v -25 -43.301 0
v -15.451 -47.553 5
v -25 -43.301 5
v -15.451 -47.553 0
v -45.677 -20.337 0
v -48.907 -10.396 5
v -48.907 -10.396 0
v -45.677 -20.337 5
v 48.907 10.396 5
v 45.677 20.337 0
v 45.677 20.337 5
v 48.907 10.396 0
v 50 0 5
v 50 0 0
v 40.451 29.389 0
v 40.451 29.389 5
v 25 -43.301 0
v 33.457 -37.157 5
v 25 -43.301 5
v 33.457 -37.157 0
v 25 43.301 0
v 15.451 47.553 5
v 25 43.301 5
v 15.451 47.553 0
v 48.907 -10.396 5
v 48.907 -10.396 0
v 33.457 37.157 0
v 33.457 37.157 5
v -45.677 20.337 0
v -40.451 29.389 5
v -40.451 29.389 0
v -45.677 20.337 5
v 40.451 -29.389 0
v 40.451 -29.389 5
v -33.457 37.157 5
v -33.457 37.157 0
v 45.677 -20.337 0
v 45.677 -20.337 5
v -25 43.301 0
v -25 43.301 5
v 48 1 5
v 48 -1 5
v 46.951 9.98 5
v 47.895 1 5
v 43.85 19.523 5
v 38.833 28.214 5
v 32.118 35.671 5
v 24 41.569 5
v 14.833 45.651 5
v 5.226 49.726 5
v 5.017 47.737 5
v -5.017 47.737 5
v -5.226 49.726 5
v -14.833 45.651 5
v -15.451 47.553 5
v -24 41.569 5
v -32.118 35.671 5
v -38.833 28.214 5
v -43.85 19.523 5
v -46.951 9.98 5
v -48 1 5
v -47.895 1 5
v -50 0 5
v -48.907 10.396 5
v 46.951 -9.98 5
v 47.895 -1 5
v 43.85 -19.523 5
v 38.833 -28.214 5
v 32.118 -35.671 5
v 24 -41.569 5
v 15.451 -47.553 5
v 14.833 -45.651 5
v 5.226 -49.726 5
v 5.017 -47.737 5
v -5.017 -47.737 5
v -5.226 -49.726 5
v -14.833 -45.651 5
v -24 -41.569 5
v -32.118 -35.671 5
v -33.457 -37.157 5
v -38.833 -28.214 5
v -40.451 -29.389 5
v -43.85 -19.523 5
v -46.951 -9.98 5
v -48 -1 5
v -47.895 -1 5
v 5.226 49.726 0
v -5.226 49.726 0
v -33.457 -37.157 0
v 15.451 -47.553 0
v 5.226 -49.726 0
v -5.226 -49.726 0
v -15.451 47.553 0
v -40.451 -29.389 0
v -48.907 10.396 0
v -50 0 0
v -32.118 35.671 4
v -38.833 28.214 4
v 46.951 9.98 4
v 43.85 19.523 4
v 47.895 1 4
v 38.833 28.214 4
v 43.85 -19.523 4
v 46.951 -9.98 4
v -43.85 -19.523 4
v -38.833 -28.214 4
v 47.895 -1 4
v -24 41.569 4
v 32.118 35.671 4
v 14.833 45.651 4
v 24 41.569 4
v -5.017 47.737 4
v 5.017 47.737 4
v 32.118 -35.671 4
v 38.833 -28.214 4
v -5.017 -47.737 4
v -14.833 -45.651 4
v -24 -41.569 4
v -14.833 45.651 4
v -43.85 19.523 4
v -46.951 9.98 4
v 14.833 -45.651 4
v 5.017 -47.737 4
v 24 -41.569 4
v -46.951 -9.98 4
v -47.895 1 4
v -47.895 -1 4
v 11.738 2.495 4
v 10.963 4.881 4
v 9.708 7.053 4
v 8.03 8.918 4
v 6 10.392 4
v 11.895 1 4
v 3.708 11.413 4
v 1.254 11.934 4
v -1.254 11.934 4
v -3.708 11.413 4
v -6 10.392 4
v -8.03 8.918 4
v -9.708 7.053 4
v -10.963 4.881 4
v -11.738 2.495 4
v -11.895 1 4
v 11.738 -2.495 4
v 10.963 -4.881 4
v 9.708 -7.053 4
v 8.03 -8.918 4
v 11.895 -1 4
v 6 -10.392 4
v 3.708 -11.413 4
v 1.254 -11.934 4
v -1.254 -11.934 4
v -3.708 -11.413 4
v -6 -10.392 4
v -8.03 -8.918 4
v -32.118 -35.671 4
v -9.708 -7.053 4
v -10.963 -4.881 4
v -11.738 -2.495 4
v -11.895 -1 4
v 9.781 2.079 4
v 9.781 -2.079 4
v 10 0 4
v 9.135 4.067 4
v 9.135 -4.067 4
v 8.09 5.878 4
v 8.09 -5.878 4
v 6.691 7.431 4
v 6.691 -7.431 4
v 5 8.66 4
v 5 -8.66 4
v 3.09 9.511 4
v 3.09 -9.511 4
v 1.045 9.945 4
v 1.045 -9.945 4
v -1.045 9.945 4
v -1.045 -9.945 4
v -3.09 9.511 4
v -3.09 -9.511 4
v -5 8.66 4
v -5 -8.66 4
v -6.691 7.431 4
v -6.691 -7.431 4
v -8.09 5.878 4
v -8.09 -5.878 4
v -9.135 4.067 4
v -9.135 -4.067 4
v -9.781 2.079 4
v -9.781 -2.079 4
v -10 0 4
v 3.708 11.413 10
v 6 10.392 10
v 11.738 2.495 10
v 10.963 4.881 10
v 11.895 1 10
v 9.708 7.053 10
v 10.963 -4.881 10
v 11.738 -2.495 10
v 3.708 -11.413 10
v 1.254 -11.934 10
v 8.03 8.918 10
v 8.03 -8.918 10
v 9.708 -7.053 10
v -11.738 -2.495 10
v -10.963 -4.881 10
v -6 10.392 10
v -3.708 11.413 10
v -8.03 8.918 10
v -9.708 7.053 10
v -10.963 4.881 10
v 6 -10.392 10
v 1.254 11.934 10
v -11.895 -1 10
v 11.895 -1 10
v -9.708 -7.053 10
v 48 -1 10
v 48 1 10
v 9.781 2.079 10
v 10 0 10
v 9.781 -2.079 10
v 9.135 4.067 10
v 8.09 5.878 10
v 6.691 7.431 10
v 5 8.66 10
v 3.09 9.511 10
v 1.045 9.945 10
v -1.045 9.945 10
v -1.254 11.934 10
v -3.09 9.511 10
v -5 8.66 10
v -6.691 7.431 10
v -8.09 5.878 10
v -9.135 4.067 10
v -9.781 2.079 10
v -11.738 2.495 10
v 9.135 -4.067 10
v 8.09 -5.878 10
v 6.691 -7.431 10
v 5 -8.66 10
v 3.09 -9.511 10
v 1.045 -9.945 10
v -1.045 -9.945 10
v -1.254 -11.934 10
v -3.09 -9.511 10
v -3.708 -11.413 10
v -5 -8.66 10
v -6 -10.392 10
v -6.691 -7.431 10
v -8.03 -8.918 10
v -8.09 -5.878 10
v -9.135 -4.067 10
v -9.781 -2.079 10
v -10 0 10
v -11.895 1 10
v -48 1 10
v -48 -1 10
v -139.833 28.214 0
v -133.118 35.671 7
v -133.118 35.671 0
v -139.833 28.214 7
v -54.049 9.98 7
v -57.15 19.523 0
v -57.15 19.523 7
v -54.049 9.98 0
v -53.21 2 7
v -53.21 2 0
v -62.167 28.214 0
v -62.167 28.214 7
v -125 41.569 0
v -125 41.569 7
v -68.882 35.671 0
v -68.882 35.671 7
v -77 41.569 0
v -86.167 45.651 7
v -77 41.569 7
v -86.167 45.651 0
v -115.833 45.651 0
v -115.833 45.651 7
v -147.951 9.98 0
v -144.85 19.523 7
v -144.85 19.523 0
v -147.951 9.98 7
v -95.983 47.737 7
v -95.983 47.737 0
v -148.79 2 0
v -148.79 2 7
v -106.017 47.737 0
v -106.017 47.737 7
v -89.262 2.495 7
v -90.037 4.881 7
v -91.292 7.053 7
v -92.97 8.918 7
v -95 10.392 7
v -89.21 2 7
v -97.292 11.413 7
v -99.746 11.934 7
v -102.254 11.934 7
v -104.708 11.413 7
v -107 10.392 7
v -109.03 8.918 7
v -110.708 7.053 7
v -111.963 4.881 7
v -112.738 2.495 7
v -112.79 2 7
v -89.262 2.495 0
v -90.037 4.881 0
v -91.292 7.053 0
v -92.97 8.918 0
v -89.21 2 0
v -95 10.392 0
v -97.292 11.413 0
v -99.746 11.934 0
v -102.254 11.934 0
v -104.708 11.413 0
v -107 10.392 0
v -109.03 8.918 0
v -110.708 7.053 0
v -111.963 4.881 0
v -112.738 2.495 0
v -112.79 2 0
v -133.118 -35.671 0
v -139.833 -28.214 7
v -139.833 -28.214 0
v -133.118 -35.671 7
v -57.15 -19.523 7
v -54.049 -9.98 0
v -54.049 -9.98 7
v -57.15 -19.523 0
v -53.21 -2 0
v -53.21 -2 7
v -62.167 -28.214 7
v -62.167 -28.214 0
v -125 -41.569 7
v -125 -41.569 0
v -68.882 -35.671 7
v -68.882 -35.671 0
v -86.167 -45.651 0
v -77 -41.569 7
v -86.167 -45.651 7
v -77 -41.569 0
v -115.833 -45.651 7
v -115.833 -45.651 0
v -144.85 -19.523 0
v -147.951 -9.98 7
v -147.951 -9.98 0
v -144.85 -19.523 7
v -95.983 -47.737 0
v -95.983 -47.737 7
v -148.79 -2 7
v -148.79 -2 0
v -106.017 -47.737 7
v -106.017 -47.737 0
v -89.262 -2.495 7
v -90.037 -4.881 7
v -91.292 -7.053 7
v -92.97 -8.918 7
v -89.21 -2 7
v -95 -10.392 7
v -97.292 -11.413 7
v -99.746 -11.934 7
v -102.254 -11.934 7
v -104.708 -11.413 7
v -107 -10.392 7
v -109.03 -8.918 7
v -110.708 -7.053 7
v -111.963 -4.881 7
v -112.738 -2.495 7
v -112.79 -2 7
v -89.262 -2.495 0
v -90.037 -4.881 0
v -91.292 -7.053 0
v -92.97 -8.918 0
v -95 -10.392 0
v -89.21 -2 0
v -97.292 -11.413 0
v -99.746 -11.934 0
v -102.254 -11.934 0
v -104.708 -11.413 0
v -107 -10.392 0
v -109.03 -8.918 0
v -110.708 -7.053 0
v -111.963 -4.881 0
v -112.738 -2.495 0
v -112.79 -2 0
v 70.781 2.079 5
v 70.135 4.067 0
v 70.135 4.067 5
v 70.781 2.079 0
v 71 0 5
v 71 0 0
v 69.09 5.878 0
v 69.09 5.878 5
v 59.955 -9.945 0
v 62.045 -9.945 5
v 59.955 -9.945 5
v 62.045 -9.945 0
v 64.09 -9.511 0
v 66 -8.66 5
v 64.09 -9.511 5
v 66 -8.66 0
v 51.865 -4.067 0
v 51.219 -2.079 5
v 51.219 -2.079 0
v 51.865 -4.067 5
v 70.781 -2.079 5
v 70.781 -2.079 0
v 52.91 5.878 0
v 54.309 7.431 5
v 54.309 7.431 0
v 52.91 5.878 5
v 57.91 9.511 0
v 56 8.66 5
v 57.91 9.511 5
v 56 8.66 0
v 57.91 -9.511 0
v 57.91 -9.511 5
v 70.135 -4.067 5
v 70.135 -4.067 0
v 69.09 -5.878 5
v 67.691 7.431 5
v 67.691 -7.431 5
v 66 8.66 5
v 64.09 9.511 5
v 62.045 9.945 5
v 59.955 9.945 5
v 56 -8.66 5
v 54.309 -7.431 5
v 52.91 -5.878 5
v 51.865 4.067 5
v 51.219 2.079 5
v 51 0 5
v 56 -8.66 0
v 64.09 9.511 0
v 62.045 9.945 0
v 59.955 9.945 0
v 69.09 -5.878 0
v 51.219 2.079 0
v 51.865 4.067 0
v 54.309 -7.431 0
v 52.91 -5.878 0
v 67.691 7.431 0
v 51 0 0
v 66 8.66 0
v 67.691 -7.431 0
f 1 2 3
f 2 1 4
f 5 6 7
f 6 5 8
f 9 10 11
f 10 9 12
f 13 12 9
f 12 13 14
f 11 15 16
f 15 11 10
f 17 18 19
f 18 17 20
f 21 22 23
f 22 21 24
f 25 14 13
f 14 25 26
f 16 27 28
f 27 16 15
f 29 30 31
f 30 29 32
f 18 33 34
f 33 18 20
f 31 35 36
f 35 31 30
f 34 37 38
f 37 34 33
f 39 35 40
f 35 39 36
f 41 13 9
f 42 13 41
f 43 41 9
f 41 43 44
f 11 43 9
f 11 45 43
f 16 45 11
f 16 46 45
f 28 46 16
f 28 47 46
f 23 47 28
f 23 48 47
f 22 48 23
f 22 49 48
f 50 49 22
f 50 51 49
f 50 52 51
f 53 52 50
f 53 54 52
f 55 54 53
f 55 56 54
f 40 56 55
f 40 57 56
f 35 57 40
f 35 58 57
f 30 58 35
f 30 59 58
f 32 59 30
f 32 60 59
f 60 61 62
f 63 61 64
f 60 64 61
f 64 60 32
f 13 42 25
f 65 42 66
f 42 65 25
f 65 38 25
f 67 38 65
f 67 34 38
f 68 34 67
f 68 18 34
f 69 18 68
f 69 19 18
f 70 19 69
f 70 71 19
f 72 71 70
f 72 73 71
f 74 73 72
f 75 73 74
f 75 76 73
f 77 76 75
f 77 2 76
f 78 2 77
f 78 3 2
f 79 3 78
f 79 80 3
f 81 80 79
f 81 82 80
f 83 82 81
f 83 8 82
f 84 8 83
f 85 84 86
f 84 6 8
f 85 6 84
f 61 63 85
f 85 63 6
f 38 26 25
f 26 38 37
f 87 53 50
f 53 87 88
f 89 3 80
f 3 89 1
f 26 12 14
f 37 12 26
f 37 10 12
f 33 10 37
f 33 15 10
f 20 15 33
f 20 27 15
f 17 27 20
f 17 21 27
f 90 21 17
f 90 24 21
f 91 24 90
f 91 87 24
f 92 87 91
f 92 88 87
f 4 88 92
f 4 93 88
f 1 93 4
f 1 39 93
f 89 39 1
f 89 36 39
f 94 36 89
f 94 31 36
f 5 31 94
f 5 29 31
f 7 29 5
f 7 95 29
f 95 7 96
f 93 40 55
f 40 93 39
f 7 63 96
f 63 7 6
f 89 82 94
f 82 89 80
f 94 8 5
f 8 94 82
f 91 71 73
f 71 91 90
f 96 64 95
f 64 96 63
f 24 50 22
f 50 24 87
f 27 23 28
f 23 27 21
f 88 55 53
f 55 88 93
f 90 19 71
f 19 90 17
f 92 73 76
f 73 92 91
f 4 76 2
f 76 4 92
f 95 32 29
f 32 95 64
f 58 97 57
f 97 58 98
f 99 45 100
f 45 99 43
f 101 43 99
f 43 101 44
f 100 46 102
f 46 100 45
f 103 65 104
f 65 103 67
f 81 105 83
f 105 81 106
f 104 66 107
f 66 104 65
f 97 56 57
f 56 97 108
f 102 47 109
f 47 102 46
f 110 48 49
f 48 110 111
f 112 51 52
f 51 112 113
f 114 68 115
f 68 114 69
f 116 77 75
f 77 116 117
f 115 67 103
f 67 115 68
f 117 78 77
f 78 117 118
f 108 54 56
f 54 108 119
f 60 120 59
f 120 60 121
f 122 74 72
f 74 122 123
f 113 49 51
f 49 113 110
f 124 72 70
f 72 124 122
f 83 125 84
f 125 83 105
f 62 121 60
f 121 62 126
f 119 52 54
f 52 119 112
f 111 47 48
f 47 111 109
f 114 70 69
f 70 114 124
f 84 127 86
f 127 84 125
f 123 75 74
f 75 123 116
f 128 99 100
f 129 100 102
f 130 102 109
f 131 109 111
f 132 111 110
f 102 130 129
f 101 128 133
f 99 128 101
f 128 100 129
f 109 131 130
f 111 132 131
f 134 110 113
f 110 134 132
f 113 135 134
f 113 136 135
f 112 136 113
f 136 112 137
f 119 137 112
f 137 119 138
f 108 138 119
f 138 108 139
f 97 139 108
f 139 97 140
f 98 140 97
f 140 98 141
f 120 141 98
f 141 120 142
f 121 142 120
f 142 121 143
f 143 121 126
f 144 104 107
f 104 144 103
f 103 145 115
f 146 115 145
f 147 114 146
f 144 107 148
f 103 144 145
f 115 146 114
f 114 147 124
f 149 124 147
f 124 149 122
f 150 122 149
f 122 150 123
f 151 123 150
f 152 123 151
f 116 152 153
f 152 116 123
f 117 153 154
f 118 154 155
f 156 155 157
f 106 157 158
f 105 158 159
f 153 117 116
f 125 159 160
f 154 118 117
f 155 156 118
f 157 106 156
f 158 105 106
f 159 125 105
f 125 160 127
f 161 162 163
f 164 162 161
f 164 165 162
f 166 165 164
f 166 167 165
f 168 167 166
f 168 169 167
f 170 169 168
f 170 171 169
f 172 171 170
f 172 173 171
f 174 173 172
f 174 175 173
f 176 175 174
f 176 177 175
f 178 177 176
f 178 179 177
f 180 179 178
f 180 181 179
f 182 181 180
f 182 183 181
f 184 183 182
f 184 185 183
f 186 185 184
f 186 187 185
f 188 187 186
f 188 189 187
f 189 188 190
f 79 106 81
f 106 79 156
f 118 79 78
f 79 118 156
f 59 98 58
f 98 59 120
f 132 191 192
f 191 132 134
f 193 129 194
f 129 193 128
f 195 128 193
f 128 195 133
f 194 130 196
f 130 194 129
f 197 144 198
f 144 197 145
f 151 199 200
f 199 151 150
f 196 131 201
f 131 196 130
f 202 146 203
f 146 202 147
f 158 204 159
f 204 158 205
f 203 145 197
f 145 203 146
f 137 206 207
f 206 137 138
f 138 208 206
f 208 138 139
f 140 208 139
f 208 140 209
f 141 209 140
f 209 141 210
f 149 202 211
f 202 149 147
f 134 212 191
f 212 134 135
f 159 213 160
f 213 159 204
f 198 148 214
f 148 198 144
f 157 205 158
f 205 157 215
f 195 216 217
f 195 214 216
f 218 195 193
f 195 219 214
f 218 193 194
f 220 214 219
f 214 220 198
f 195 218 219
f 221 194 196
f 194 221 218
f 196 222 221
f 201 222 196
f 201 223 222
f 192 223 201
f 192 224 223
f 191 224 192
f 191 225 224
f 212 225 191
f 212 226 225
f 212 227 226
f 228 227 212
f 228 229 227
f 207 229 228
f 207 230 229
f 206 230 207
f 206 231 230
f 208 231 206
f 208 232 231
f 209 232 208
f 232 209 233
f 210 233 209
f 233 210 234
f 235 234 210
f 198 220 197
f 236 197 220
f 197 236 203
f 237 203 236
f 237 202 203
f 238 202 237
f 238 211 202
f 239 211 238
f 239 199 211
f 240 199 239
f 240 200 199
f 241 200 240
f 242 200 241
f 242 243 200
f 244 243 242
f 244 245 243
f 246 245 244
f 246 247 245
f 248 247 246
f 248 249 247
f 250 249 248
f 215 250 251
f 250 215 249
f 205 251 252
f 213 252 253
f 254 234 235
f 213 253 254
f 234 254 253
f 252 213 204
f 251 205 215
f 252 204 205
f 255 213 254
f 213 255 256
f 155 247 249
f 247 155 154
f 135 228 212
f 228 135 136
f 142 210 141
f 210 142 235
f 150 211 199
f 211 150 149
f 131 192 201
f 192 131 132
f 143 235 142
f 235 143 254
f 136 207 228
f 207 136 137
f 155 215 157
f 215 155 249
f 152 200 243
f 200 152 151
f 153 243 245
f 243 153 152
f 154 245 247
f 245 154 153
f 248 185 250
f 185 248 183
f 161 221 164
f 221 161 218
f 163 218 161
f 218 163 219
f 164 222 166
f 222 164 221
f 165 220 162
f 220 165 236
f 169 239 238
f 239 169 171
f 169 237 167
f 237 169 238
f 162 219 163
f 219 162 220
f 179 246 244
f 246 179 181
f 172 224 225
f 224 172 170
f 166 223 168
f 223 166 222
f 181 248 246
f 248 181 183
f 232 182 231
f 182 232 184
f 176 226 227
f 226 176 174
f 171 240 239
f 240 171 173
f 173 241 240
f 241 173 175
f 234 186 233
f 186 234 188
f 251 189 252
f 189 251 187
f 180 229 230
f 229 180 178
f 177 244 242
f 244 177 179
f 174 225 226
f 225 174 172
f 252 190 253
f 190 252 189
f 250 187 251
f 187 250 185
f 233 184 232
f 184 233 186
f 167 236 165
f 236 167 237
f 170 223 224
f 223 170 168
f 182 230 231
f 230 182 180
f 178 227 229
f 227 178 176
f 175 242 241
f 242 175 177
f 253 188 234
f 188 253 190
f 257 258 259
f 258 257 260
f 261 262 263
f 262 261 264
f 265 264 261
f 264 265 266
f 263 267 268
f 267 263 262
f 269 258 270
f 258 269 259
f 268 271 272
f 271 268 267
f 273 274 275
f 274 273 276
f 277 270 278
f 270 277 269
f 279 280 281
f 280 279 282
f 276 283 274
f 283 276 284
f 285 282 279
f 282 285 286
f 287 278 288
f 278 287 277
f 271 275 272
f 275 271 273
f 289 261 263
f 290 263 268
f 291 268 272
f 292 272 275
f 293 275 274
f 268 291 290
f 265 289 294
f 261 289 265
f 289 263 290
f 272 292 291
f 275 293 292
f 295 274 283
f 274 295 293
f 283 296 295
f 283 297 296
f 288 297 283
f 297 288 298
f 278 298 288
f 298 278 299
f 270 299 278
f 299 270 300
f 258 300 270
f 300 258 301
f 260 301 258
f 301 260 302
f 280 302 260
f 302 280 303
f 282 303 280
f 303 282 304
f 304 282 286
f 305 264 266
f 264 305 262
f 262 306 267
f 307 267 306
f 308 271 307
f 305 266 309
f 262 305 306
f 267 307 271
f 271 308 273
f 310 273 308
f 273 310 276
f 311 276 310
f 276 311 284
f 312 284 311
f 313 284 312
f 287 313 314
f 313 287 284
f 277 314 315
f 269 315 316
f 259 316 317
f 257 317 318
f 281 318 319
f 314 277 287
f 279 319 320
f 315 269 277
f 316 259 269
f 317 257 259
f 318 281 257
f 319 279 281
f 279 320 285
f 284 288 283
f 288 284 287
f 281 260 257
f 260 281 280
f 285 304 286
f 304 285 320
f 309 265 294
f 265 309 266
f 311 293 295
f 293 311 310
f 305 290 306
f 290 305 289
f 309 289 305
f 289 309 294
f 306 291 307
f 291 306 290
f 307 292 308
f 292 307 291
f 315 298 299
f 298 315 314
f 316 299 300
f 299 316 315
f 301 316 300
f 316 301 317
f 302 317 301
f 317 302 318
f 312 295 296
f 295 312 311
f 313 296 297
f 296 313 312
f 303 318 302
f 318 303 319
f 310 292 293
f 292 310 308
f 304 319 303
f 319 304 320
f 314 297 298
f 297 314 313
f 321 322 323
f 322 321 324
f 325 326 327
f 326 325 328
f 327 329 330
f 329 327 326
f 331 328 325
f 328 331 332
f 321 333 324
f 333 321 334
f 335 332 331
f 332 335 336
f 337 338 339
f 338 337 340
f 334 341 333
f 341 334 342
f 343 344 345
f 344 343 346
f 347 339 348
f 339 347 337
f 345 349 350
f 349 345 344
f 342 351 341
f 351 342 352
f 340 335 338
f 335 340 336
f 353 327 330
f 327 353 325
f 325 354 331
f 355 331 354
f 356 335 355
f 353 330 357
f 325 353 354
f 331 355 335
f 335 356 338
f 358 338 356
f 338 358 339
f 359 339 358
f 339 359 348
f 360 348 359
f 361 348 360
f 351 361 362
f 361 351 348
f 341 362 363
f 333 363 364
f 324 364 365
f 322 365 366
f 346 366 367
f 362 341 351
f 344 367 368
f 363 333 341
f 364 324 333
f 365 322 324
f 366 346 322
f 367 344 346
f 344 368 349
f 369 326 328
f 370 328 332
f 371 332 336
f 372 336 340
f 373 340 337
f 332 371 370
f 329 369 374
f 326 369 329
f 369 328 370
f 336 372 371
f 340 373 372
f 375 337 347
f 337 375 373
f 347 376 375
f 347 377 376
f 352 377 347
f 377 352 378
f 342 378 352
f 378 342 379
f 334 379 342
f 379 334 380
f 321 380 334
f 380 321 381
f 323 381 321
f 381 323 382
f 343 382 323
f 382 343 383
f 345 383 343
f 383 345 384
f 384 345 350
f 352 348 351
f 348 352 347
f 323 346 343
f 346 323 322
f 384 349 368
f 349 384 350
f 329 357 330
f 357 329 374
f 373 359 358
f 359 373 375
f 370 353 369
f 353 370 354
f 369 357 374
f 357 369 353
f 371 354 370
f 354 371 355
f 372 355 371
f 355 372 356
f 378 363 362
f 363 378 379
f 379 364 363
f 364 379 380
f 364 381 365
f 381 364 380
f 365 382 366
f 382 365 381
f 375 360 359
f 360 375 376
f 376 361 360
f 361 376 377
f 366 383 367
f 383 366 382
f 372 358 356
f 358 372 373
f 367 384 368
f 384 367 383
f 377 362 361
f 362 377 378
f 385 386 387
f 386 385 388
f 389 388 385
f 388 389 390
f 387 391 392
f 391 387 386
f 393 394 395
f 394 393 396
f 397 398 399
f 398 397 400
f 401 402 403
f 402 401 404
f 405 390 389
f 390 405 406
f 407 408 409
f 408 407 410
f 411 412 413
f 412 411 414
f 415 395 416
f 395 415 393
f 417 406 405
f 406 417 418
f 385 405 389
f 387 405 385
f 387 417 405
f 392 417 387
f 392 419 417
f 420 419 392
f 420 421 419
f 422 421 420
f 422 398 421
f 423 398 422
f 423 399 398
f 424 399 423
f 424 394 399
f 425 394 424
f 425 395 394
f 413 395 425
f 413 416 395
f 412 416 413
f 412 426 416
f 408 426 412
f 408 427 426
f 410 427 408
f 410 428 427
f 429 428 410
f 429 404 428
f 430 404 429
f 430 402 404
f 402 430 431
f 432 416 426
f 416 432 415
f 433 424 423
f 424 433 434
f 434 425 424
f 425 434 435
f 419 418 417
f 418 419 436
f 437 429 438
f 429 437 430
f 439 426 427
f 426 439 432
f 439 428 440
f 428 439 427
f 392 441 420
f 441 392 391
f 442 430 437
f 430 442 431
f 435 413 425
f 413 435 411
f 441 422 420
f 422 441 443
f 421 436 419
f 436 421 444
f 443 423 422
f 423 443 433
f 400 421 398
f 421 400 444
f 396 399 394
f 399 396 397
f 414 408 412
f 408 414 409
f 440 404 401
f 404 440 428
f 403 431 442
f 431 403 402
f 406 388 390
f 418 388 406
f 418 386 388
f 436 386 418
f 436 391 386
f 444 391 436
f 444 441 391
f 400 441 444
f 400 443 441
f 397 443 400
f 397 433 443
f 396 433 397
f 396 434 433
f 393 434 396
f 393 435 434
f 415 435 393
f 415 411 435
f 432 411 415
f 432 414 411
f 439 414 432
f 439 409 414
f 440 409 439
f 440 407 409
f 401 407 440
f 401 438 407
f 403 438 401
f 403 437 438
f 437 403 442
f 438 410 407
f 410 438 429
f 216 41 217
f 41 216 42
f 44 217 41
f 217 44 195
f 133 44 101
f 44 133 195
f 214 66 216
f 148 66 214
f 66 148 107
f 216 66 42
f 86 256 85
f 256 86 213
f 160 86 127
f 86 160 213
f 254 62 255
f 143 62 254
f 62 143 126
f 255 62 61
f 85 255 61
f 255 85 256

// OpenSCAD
//base height
height = 5;
//base radius
radius = 50;
//base thickness
thickness = 2;
//base deep
deep = 2;

//small circle height
sheight = 5;
//small circle radius
sradius = 10;

//lines thickness
line_thickness = 2;

difference()
{
    cylinder(height, radius, radius, false);
    translate([0, 0, height])
    cylinder(deep, radius - thickness, radius - thickness, true);
}

//small circle
difference()
{
   cylinder(sheight + height, 
            sradius + thickness, 
            sradius + thickness, false);
    cylinder(sheight + height, 
            sradius, sradius, false);
}

translate([radius + sradius + 1, 0, 0]) cylinder(sheight, sradius, sradius, false);

//lines
//difference(){
    translate([(sradius + thickness/2), -thickness/2, 0]) cube([radius-sradius-1.5*thickness,line_thickness,sheight + height],false);
    
  //  translate([(radius - thickness), -thickness/2, height]) rotate([-90,0,0]) { cylinder(5, 5, 5, false);}
//}

mirror([1, 0, 0]) 
translate([(sradius + thickness/2), -thickness/2, 0]) cube([radius-sradius-1.5*thickness,line_thickness,sheight + height],false);


//red part
translate([-(2*radius + 1), 0, 0])
difference()
{
    cylinder(sheight+deep, radius - thickness, radius - thickness, false);
    translate([0, -(radius - thickness)+line_thickness, 0])
    cube(2*(radius - thickness), center=true); 
    cylinder(sheight + deep, 
            sradius + thickness, 
            sradius + thickness, false);
}

//white part
translate([-(2*radius + 1), 0, 0])
mirror([0, -(2*radius + 1), 0]) 
difference()
{
    cylinder(sheight+deep, radius - thickness, radius - thickness, false);
    translate([0, -(radius - thickness)+line_thickness, 0])
    cube(2*(radius - thickness), center=true); 
    cylinder(sheight + deep, 
            sradius + thickness, 
            sradius + thickness, false);
}
